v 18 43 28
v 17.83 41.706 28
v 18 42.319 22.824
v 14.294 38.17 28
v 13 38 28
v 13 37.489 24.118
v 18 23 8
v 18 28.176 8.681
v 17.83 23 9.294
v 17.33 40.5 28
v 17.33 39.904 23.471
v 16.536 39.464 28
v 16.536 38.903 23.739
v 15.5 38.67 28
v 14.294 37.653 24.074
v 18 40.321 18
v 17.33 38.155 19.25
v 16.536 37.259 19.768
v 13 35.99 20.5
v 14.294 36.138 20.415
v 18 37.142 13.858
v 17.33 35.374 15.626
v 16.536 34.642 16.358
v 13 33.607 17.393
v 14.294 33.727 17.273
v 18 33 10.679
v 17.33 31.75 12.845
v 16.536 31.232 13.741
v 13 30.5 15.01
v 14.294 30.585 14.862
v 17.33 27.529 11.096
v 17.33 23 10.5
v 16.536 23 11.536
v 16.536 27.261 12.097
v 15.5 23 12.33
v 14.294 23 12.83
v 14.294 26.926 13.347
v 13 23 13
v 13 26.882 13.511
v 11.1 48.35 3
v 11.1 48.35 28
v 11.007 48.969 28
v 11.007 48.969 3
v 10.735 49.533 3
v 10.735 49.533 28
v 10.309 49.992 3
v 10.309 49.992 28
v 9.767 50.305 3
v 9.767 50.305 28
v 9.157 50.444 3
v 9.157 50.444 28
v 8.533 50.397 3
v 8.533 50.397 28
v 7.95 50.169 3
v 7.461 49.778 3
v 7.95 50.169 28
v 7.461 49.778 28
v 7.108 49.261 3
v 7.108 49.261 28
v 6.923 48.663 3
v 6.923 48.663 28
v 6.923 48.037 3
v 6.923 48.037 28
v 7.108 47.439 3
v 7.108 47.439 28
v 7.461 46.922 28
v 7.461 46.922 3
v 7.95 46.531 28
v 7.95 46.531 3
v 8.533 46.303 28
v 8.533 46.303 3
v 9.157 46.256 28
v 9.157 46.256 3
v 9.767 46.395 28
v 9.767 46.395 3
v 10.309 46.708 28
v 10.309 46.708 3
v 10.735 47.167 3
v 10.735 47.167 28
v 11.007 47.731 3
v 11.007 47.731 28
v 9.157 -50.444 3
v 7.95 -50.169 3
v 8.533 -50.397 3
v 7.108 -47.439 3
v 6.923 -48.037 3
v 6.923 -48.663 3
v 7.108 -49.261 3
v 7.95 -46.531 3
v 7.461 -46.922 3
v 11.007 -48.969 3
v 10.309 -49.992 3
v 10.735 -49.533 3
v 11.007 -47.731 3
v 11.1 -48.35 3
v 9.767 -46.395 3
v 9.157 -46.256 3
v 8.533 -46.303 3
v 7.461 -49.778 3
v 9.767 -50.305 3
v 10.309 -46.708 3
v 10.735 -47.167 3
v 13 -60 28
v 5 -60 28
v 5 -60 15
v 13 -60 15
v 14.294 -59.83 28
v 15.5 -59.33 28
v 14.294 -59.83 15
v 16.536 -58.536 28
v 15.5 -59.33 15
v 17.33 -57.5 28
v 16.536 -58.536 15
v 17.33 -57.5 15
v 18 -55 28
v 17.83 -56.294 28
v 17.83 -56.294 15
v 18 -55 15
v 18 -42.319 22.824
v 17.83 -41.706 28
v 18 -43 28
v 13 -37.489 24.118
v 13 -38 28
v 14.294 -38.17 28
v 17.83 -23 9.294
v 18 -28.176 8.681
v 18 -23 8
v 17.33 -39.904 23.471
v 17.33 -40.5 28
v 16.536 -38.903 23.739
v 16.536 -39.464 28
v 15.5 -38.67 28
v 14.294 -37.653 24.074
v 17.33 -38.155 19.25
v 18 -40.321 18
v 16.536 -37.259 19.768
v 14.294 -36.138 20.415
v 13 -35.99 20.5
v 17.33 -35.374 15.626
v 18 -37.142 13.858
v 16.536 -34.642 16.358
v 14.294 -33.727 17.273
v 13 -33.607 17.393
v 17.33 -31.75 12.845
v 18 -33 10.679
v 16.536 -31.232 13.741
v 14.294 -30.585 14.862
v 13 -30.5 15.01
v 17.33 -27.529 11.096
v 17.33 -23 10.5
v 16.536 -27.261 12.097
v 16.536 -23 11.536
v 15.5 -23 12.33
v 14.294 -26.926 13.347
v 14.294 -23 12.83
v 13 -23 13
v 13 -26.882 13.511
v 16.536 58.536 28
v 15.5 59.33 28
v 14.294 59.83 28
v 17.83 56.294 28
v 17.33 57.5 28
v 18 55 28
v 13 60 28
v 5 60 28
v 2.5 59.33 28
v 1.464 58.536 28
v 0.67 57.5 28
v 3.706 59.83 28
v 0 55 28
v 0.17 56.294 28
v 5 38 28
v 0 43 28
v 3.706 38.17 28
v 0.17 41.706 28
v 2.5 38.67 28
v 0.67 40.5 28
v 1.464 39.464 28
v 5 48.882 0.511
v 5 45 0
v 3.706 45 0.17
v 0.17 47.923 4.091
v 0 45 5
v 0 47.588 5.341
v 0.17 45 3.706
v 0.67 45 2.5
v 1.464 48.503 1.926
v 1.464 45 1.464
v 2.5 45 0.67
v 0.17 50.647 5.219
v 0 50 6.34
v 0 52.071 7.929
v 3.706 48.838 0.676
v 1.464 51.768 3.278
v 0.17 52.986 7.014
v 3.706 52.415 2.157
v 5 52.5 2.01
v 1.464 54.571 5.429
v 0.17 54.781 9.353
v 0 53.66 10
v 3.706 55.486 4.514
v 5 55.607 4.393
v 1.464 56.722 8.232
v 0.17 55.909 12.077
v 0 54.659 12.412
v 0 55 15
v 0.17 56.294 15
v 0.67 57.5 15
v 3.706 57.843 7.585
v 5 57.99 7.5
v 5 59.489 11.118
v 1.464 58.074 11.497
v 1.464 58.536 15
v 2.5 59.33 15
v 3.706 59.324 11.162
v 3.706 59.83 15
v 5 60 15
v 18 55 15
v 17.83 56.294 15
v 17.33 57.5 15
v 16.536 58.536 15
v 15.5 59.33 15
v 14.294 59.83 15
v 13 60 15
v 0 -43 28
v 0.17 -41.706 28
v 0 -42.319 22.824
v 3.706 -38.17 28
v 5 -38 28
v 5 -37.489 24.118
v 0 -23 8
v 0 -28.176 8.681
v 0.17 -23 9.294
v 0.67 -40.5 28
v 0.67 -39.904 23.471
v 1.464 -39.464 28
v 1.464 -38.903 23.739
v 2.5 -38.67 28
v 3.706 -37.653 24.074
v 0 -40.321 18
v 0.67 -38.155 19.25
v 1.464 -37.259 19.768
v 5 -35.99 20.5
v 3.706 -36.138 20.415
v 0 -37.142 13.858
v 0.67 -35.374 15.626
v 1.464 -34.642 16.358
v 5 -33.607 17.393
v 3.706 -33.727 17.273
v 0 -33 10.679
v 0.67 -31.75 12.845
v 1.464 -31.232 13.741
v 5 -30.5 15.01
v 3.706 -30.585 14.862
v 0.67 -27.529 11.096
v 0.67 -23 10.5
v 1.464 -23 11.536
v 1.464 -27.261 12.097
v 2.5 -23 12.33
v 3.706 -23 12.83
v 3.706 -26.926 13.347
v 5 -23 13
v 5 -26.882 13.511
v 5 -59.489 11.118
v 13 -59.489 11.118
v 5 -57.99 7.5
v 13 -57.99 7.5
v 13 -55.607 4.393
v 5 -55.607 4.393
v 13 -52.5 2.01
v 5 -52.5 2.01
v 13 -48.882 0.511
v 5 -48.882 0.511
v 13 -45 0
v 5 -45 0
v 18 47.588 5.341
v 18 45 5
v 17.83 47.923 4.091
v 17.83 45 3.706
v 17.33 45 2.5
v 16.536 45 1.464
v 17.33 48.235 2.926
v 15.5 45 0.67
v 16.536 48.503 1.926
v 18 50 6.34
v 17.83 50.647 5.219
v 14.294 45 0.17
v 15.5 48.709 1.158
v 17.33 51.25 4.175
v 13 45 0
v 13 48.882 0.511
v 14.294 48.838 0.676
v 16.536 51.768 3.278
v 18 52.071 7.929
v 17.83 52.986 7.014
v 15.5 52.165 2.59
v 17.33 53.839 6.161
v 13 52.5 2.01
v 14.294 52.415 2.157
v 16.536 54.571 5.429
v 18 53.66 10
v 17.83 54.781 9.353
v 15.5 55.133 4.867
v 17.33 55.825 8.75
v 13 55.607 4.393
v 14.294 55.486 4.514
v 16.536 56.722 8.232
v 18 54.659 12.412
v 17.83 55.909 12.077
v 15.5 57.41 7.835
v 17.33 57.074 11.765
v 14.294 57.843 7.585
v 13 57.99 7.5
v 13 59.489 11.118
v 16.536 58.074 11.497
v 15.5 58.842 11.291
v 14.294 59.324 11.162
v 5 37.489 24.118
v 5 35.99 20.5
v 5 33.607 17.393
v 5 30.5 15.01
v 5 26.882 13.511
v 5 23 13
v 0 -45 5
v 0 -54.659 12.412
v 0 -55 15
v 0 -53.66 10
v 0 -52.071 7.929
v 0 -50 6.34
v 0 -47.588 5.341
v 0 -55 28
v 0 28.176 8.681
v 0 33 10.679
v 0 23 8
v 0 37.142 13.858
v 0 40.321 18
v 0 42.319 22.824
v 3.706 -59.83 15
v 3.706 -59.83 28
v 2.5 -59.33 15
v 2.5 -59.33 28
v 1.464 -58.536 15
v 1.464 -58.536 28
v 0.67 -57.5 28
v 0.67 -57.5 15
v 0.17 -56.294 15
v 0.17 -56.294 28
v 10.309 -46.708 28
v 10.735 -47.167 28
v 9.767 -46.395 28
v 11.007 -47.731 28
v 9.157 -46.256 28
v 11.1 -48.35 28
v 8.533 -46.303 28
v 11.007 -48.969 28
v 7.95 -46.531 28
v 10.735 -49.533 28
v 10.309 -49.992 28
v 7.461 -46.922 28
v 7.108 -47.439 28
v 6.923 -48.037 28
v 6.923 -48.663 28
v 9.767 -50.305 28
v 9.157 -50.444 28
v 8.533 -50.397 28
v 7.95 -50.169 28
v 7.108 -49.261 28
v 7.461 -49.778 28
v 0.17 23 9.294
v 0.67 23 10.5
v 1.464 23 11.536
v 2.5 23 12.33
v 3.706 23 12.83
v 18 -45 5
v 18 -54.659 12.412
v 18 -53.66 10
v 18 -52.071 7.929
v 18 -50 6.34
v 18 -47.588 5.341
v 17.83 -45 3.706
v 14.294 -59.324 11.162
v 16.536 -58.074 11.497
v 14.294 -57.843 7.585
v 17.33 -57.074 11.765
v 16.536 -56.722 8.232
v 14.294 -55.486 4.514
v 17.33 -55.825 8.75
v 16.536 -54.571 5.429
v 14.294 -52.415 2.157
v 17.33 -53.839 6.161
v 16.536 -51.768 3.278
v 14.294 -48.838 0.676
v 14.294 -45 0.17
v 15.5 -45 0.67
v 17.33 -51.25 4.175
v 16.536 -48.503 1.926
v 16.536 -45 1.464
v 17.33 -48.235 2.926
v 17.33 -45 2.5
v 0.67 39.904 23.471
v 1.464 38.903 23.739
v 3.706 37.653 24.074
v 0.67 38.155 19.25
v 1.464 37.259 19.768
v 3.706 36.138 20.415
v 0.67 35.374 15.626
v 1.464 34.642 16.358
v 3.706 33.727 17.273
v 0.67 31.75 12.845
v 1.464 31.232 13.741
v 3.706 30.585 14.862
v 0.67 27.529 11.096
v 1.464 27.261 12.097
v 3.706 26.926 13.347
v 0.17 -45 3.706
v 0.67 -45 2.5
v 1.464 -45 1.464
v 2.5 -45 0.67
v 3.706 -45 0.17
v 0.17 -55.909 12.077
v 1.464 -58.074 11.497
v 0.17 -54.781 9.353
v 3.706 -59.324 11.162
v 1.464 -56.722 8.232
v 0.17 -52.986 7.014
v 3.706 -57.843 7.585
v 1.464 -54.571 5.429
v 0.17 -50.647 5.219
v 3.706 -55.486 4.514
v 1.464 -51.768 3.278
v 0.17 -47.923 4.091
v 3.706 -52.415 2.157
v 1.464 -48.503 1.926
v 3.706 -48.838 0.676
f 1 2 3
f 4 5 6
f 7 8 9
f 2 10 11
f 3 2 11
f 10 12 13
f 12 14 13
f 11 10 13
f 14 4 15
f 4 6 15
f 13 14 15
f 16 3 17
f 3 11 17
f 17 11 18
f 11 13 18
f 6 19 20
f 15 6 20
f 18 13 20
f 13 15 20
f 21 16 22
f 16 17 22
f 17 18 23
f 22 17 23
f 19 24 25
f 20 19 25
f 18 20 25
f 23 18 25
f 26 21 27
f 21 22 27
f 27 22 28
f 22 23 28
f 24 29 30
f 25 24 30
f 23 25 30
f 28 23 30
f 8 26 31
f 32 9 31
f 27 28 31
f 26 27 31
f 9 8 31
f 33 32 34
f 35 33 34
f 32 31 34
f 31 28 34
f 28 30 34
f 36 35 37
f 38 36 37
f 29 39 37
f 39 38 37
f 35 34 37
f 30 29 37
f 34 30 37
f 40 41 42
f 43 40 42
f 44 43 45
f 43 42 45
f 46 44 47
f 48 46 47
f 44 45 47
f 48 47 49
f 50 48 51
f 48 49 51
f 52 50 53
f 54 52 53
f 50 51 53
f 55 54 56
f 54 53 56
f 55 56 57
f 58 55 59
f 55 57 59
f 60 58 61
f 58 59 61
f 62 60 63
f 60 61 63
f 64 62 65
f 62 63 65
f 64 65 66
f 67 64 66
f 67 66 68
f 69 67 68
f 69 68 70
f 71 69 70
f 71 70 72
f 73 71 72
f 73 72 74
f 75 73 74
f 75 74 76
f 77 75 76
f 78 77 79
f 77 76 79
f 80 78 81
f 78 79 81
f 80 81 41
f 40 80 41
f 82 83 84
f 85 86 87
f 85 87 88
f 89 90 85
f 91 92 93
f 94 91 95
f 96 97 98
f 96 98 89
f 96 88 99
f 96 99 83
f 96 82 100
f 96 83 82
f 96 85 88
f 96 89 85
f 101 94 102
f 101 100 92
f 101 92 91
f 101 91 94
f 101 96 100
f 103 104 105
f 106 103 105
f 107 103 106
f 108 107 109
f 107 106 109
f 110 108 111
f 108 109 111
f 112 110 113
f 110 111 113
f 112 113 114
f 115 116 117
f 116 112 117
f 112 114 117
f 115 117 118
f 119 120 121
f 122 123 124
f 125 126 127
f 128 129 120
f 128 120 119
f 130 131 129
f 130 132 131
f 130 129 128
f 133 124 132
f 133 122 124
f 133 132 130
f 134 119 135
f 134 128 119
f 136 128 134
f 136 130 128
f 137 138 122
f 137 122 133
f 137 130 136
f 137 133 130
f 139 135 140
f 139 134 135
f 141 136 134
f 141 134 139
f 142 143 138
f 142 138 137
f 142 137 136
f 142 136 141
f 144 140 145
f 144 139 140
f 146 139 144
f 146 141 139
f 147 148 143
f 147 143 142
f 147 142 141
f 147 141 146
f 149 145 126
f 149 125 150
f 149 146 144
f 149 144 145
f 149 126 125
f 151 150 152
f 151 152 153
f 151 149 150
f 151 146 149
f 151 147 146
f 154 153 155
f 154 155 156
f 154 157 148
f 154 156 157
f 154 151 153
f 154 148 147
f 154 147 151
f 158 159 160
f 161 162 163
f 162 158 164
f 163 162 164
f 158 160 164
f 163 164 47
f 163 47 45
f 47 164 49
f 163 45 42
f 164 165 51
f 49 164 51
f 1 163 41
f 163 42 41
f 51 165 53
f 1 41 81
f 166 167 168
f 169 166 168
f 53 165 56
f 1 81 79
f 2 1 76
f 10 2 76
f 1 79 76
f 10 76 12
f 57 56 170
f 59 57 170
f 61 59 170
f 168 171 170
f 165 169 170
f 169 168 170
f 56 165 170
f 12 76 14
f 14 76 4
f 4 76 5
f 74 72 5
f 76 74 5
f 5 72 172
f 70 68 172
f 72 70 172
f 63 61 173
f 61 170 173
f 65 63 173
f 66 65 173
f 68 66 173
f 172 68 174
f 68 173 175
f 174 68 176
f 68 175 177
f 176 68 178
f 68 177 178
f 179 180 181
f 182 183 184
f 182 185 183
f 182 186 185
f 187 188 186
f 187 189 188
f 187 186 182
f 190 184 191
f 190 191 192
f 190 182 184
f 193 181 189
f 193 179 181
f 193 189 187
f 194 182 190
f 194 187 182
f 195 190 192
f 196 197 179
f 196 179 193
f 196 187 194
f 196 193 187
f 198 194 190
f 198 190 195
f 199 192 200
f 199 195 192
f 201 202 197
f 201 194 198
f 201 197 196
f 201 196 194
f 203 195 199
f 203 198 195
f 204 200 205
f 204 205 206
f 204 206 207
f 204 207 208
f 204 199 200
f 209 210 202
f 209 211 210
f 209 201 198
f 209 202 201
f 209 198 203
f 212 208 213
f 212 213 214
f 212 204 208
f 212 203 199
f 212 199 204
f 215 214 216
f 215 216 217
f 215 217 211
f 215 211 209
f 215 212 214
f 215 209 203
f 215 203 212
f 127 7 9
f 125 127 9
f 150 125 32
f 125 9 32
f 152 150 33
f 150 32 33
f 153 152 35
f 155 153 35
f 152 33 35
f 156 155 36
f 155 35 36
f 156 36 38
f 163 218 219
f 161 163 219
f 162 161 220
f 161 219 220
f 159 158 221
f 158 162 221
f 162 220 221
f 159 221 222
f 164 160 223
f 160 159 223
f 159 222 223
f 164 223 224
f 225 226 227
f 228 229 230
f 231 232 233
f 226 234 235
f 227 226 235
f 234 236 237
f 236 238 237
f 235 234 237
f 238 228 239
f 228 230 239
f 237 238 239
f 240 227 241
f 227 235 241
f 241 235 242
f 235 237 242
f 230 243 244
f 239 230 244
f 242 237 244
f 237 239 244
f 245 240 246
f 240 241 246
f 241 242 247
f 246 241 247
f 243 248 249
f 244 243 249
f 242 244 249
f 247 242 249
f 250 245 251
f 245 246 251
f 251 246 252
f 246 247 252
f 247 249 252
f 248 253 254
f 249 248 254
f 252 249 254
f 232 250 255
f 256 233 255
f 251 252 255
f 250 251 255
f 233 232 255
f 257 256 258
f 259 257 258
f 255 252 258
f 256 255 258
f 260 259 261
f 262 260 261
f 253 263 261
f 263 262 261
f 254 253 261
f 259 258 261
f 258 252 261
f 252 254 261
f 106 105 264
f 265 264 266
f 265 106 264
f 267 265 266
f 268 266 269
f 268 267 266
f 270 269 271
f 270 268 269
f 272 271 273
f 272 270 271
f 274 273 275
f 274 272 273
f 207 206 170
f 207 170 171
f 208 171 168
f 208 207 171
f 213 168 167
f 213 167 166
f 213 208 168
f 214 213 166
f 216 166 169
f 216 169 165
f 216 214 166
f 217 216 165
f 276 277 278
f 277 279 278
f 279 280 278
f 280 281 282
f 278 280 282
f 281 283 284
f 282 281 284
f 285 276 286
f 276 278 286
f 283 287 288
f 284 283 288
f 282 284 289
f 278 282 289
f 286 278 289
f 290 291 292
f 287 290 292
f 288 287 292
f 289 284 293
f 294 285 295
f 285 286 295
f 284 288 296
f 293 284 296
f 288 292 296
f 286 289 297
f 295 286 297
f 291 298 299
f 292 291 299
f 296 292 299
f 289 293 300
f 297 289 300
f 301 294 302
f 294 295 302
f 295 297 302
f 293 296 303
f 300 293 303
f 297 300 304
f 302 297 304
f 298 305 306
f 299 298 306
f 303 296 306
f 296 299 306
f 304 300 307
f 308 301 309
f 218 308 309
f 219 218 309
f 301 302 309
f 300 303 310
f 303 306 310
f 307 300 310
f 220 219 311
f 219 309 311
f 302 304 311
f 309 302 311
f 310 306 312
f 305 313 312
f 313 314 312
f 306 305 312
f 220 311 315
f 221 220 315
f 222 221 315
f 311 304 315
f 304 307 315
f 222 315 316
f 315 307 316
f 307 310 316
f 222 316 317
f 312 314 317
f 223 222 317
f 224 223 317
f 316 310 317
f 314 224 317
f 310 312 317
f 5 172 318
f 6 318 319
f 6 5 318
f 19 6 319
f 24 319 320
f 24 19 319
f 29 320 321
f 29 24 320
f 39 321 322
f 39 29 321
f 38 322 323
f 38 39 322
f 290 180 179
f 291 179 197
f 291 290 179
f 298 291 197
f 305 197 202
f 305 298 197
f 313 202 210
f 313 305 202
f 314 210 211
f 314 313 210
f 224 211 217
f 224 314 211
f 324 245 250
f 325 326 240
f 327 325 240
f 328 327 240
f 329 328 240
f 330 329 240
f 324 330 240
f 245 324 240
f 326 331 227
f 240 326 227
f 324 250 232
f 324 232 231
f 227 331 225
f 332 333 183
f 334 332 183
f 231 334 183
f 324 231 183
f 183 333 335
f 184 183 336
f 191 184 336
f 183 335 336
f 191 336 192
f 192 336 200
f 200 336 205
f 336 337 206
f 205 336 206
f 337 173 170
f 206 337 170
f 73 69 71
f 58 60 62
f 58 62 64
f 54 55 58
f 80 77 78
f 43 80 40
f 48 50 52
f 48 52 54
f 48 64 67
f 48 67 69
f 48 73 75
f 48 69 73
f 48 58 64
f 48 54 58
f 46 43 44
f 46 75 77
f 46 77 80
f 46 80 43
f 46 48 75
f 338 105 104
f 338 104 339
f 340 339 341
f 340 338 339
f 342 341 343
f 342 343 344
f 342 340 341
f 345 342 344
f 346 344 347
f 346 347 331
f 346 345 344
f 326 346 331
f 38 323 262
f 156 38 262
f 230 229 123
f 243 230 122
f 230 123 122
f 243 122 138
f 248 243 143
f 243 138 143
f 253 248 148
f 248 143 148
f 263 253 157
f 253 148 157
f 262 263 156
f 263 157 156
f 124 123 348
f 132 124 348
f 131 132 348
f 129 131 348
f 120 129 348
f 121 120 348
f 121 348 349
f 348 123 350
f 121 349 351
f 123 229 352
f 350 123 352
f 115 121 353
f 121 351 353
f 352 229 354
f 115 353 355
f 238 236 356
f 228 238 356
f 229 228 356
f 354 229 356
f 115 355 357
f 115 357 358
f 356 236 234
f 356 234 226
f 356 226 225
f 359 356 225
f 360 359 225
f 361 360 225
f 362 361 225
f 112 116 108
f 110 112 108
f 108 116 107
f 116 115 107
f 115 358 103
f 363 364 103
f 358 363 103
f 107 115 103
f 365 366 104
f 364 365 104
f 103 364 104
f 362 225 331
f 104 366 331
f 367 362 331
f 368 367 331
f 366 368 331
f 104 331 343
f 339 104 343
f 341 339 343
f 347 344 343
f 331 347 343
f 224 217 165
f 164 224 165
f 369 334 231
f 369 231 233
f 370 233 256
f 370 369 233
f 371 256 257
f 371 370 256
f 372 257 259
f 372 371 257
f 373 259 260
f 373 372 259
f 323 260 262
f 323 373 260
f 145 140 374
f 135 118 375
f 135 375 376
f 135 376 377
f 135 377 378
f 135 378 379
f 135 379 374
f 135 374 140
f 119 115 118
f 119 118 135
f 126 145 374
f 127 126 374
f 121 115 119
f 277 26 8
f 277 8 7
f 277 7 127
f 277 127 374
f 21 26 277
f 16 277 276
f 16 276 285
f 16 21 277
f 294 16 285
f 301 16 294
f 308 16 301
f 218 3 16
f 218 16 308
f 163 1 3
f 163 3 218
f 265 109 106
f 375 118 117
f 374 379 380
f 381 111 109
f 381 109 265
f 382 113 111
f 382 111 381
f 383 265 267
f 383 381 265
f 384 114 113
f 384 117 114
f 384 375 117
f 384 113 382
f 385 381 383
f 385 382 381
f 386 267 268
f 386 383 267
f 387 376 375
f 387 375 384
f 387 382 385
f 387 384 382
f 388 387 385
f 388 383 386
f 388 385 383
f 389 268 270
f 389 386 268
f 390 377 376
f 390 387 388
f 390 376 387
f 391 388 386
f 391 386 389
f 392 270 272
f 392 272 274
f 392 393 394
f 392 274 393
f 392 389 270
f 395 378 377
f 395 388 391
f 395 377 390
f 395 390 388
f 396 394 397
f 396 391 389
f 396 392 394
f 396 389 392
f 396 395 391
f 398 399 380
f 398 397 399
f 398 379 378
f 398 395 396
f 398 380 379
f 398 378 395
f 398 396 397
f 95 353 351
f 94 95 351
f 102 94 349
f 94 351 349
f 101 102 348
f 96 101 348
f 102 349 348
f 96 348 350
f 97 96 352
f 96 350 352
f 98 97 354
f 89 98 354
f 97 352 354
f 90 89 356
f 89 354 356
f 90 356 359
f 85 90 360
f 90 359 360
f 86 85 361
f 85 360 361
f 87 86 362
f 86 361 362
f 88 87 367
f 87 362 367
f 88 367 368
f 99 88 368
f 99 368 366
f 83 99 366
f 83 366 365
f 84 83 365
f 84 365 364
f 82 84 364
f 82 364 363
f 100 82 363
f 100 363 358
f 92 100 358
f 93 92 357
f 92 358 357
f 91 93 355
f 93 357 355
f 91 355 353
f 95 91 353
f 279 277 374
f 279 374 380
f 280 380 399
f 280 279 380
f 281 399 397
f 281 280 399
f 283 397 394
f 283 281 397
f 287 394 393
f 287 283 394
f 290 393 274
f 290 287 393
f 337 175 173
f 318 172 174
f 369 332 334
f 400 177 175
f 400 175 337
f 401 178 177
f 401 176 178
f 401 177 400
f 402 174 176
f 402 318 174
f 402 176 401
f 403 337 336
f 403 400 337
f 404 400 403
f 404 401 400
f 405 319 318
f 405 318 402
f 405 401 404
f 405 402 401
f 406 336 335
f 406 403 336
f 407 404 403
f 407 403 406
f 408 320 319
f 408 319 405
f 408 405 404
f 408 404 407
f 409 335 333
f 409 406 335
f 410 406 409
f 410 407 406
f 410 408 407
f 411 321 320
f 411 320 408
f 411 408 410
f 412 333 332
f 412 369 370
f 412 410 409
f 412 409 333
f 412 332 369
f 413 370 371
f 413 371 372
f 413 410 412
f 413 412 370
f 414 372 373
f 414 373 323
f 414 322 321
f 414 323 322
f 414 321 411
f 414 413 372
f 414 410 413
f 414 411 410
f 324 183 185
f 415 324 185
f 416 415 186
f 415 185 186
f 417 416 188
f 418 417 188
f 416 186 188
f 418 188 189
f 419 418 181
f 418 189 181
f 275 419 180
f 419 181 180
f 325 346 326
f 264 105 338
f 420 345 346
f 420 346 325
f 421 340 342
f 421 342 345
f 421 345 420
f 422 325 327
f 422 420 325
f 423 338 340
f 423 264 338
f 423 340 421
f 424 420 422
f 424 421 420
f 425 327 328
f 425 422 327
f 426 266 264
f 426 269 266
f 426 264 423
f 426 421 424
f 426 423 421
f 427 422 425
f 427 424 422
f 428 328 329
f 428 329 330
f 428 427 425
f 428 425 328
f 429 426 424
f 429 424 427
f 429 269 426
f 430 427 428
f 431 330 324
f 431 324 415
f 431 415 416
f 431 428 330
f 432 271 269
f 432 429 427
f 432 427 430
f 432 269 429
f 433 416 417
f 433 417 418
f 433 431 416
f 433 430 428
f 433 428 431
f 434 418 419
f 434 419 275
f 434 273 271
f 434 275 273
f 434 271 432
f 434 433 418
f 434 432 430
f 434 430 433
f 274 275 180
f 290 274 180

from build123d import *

# Parameters (mm, degrees)
F1_DEPTH     = 18
F3_R         = 2.1
F4_DEPTH     = 25
F5_R         = 14.99999
F6_T1_DEPTH  = 90.00002
F6_T3_DEPTH  = 46.00002
F6_T5_DEPTH  = 12.50001
F6_T7_DEPTH  = 25.50001
F6_T10_ANGLE = 90
F6_T12_ANGLE = 90
F6_T14_ANGLE = 90
F6_T16_ANGLE = 90
F6_T18_ANGLE = 90
F6_T20_ANGLE = 90
F6_T22_ANGLE = 90
F6_T24_ANGLE = 90


# Not quite as in the source:
# - a fillet or chamfer that OpenCascade refuses, or shapes differently, is made with other operations: its cross-section is extruded or revolved along the edge and cut away or added
# - a fillet or chamfer is up to 0.001 mm smaller than in the source, because OpenCascade refuses the exact size


with BuildPart() as f1:
    # F0 (on Right) → F1 (new body)
    with BuildSketch(Plane.YZ):
        Polygon((-60, 28), (-60, 0), (0, 0), (60, 0), (60, 28), (38, 28), (38, 13), (-38, 13), (-38, 28), align=None)
    extrude(amount=F1_DEPTH)

    # F3 (on offset) → F4 (cut)
    with BuildSketch(Plane.XY.offset(28)):
        with Locations((9, 48.35)):
            Circle(F3_R)
        with Locations((9, -48.35)):
            Circle(F3_R)
    extrude(amount=-F4_DEPTH, mode=Mode.SUBTRACT)

    # F5 (radius 15 in the source; OpenCascade refuses exactly that, so slightly less here)
    f5_edges = [f1.edges().sort_by_distance(p)[0] for p in [
        (9, 60, 0),
        (9, -60, 0),
        (9, -38, 13),
        (9, 38, 13),
    ]]
    fillet(f5_edges, radius=F5_R)

    # F6: fillet of radius 5 on 4 edges, made by hand

    # F6_s2 → F6_t1 (cut)
    with BuildSketch(Plane.XZ.offset(-45.00001)):
        with BuildLine():
            ThreePointArc((0, 5), (1.4644660941, 1.4644660941), (5, 0))
            Line((5, 0), (0, 0))
            Line((0, 0), (0, 5))
        make_face()
        with BuildLine():
            ThreePointArc((18, 5), (16.5355339059, 1.4644660941), (13, 0))
            Line((13, 0), (18, 0))
            Line((18, 0), (18, 5))
        make_face()
    extrude(amount=F6_T1_DEPTH, mode=Mode.SUBTRACT)

    # F6_s4 → F6_t3 (cut)
    with BuildSketch(Plane.XZ.offset(-23.00001)):
        with BuildLine():
            ThreePointArc((0, 8), (1.4644660941, 11.5355339059), (5, 13))
            Line((5, 13), (0, 13))
            Line((0, 13), (0, 8))
        make_face()
        with BuildLine():
            ThreePointArc((18, 8), (16.5355339059, 11.5355339059), (13, 13))
            Line((13, 13), (18, 13))
            Line((18, 13), (18, 8))
        make_face()
    extrude(amount=F6_T3_DEPTH, mode=Mode.SUBTRACT)

    # F6_s6 → F6_t5 (cut)
    with BuildSketch(Plane.XY.offset(27.99999)):
        with BuildLine():
            ThreePointArc((18, -43), (16.5355339059, -39.4644660941), (13, -38))
            Line((13, -38), (18, -38))
            Line((18, -38), (18, -43))
        make_face()
        with BuildLine():
            ThreePointArc((18, 43), (16.5355339059, 39.4644660941), (13, 38))
            Line((13, 38), (18, 38))
            Line((18, 38), (18, 43))
        make_face()
        with BuildLine():
            ThreePointArc((0, -43), (1.4644660941, -39.4644660941), (5, -38))
            Line((5, -38), (0, -38))
            Line((0, -38), (0, -43))
        make_face()
        with BuildLine():
            ThreePointArc((0, 43), (1.4644660941, 39.4644660941), (5, 38))
            Line((5, 38), (0, 38))
            Line((0, 38), (0, 43))
        make_face()
    extrude(amount=F6_T5_DEPTH, mode=Mode.SUBTRACT)

    # F6_s8 → F6_t7 (cut)
    with BuildSketch(Plane.XY.offset(14.99999)):
        with BuildLine():
            ThreePointArc((13, -60), (16.5355339059, -58.5355339059), (18, -55))
            Line((18, -55), (18, -60))
            Line((18, -60), (13, -60))
        make_face()
        with BuildLine():
            ThreePointArc((18, 55), (16.5355339059, 58.5355339059), (13, 60))
            Line((13, 60), (18, 60))
            Line((18, 60), (18, 55))
        make_face()
        with BuildLine():
            ThreePointArc((0, 55), (1.4644660941, 58.5355339059), (5, 60))
            Line((5, 60), (0, 60))
            Line((0, 60), (0, 55))
        make_face()
        with BuildLine():
            ThreePointArc((5, -60), (1.4644660941, -58.5355339059), (0, -55))
            Line((0, -55), (0, -60))
            Line((0, -60), (5, -60))
        make_face()
    extrude(amount=F6_T7_DEPTH, mode=Mode.SUBTRACT)

    # F6_s9 → F6_t10 (revolve, cut)
    with BuildSketch(Plane.XY.offset(27.99999)):
        with BuildLine():
            ThreePointArc((18, 43), (16.5355339059, 39.4644660941), (13, 38))
            Line((13, 38), (18, 38))
            Line((18, 38), (18, 43))
        make_face()
    revolve(axis=Axis((18, 23.00001, 27.99999), (-1, 0, 0)), revolution_arc=F6_T10_ANGLE, mode=Mode.SUBTRACT)

    # F6_s11 → F6_t12 (revolve, cut)
    with BuildSketch(Plane.XY.offset(27.99999)):
        with BuildLine():
            ThreePointArc((18, -43), (16.5355339059, -39.4644660941), (13, -38))
            Line((13, -38), (18, -38))
            Line((18, -38), (18, -43))
        make_face()
    revolve(axis=Axis((18, -23.00001, 27.99999), (1, 0, 0)), revolution_arc=F6_T12_ANGLE, mode=Mode.SUBTRACT)

    # F6_s13 → F6_t14 (revolve, cut)
    with BuildSketch(Plane.XY.offset(27.99999)):
        with BuildLine():
            ThreePointArc((0, 43), (1.4644660941, 39.4644660941), (5, 38))
            Line((5, 38), (0, 38))
            Line((0, 38), (0, 43))
        make_face()
    revolve(axis=Axis((0, 23.00001, 27.99999), (-1, 0, 0)), revolution_arc=F6_T14_ANGLE, mode=Mode.SUBTRACT)

    # F6_s15 → F6_t16 (revolve, cut)
    with BuildSketch(Plane.XY.offset(27.99999)):
        with BuildLine():
            ThreePointArc((0, -43), (1.4644660941, -39.4644660941), (5, -38))
            Line((5, -38), (0, -38))
            Line((0, -38), (0, -43))
        make_face()
    revolve(axis=Axis((0, -23.00001, 27.99999), (1, 0, 0)), revolution_arc=F6_T16_ANGLE, mode=Mode.SUBTRACT)

    # F6_s17 → F6_t18 (revolve, cut)
    with BuildSketch(Plane.XZ.offset(-45.00001)):
        with BuildLine():
            ThreePointArc((18, 5), (16.5355339059, 1.4644660941), (13, 0))
            Line((13, 0), (18, 0))
            Line((18, 0), (18, 5))
        make_face()
    revolve(axis=Axis((18, 45.00001, 14.99999), (1, 0, 0)), revolution_arc=F6_T18_ANGLE, mode=Mode.SUBTRACT)

    # F6_s19 → F6_t20 (revolve, cut)
    with BuildSketch(Plane.XY.offset(14.99999)):
        with BuildLine():
            ThreePointArc((13, -60), (16.5355339059, -58.5355339059), (18, -55))
            Line((18, -55), (18, -60))
            Line((18, -60), (13, -60))
        make_face()
    revolve(axis=Axis((18, -45.00001, 14.99999), (1, 0, 0)), revolution_arc=F6_T20_ANGLE, mode=Mode.SUBTRACT)

    # F6_s21 → F6_t22 (revolve, cut)
    with BuildSketch(Plane.XY.offset(14.99999)):
        with BuildLine():
            ThreePointArc((0, -55), (1.4644660941, -58.5355339059), (5, -60))
            Line((5, -60), (0, -60))
            Line((0, -60), (0, -55))
        make_face()
    revolve(axis=Axis((0, -45.00001, 14.99999), (1, 0, 0)), revolution_arc=F6_T22_ANGLE, mode=Mode.SUBTRACT)

    # F6_s23 → F6_t24 (revolve, cut)
    with BuildSketch(Plane.XZ.offset(-45.00001)):
        with BuildLine():
            ThreePointArc((0, 5), (1.4644660941, 1.4644660941), (5, 0))
            Line((5, 0), (0, 0))
            Line((0, 0), (0, 5))
        make_face()
    revolve(axis=Axis((0, 45.00001, 14.99999), (1, 0, 0)), revolution_arc=F6_T24_ANGLE, mode=Mode.SUBTRACT)


solid = f1.part
